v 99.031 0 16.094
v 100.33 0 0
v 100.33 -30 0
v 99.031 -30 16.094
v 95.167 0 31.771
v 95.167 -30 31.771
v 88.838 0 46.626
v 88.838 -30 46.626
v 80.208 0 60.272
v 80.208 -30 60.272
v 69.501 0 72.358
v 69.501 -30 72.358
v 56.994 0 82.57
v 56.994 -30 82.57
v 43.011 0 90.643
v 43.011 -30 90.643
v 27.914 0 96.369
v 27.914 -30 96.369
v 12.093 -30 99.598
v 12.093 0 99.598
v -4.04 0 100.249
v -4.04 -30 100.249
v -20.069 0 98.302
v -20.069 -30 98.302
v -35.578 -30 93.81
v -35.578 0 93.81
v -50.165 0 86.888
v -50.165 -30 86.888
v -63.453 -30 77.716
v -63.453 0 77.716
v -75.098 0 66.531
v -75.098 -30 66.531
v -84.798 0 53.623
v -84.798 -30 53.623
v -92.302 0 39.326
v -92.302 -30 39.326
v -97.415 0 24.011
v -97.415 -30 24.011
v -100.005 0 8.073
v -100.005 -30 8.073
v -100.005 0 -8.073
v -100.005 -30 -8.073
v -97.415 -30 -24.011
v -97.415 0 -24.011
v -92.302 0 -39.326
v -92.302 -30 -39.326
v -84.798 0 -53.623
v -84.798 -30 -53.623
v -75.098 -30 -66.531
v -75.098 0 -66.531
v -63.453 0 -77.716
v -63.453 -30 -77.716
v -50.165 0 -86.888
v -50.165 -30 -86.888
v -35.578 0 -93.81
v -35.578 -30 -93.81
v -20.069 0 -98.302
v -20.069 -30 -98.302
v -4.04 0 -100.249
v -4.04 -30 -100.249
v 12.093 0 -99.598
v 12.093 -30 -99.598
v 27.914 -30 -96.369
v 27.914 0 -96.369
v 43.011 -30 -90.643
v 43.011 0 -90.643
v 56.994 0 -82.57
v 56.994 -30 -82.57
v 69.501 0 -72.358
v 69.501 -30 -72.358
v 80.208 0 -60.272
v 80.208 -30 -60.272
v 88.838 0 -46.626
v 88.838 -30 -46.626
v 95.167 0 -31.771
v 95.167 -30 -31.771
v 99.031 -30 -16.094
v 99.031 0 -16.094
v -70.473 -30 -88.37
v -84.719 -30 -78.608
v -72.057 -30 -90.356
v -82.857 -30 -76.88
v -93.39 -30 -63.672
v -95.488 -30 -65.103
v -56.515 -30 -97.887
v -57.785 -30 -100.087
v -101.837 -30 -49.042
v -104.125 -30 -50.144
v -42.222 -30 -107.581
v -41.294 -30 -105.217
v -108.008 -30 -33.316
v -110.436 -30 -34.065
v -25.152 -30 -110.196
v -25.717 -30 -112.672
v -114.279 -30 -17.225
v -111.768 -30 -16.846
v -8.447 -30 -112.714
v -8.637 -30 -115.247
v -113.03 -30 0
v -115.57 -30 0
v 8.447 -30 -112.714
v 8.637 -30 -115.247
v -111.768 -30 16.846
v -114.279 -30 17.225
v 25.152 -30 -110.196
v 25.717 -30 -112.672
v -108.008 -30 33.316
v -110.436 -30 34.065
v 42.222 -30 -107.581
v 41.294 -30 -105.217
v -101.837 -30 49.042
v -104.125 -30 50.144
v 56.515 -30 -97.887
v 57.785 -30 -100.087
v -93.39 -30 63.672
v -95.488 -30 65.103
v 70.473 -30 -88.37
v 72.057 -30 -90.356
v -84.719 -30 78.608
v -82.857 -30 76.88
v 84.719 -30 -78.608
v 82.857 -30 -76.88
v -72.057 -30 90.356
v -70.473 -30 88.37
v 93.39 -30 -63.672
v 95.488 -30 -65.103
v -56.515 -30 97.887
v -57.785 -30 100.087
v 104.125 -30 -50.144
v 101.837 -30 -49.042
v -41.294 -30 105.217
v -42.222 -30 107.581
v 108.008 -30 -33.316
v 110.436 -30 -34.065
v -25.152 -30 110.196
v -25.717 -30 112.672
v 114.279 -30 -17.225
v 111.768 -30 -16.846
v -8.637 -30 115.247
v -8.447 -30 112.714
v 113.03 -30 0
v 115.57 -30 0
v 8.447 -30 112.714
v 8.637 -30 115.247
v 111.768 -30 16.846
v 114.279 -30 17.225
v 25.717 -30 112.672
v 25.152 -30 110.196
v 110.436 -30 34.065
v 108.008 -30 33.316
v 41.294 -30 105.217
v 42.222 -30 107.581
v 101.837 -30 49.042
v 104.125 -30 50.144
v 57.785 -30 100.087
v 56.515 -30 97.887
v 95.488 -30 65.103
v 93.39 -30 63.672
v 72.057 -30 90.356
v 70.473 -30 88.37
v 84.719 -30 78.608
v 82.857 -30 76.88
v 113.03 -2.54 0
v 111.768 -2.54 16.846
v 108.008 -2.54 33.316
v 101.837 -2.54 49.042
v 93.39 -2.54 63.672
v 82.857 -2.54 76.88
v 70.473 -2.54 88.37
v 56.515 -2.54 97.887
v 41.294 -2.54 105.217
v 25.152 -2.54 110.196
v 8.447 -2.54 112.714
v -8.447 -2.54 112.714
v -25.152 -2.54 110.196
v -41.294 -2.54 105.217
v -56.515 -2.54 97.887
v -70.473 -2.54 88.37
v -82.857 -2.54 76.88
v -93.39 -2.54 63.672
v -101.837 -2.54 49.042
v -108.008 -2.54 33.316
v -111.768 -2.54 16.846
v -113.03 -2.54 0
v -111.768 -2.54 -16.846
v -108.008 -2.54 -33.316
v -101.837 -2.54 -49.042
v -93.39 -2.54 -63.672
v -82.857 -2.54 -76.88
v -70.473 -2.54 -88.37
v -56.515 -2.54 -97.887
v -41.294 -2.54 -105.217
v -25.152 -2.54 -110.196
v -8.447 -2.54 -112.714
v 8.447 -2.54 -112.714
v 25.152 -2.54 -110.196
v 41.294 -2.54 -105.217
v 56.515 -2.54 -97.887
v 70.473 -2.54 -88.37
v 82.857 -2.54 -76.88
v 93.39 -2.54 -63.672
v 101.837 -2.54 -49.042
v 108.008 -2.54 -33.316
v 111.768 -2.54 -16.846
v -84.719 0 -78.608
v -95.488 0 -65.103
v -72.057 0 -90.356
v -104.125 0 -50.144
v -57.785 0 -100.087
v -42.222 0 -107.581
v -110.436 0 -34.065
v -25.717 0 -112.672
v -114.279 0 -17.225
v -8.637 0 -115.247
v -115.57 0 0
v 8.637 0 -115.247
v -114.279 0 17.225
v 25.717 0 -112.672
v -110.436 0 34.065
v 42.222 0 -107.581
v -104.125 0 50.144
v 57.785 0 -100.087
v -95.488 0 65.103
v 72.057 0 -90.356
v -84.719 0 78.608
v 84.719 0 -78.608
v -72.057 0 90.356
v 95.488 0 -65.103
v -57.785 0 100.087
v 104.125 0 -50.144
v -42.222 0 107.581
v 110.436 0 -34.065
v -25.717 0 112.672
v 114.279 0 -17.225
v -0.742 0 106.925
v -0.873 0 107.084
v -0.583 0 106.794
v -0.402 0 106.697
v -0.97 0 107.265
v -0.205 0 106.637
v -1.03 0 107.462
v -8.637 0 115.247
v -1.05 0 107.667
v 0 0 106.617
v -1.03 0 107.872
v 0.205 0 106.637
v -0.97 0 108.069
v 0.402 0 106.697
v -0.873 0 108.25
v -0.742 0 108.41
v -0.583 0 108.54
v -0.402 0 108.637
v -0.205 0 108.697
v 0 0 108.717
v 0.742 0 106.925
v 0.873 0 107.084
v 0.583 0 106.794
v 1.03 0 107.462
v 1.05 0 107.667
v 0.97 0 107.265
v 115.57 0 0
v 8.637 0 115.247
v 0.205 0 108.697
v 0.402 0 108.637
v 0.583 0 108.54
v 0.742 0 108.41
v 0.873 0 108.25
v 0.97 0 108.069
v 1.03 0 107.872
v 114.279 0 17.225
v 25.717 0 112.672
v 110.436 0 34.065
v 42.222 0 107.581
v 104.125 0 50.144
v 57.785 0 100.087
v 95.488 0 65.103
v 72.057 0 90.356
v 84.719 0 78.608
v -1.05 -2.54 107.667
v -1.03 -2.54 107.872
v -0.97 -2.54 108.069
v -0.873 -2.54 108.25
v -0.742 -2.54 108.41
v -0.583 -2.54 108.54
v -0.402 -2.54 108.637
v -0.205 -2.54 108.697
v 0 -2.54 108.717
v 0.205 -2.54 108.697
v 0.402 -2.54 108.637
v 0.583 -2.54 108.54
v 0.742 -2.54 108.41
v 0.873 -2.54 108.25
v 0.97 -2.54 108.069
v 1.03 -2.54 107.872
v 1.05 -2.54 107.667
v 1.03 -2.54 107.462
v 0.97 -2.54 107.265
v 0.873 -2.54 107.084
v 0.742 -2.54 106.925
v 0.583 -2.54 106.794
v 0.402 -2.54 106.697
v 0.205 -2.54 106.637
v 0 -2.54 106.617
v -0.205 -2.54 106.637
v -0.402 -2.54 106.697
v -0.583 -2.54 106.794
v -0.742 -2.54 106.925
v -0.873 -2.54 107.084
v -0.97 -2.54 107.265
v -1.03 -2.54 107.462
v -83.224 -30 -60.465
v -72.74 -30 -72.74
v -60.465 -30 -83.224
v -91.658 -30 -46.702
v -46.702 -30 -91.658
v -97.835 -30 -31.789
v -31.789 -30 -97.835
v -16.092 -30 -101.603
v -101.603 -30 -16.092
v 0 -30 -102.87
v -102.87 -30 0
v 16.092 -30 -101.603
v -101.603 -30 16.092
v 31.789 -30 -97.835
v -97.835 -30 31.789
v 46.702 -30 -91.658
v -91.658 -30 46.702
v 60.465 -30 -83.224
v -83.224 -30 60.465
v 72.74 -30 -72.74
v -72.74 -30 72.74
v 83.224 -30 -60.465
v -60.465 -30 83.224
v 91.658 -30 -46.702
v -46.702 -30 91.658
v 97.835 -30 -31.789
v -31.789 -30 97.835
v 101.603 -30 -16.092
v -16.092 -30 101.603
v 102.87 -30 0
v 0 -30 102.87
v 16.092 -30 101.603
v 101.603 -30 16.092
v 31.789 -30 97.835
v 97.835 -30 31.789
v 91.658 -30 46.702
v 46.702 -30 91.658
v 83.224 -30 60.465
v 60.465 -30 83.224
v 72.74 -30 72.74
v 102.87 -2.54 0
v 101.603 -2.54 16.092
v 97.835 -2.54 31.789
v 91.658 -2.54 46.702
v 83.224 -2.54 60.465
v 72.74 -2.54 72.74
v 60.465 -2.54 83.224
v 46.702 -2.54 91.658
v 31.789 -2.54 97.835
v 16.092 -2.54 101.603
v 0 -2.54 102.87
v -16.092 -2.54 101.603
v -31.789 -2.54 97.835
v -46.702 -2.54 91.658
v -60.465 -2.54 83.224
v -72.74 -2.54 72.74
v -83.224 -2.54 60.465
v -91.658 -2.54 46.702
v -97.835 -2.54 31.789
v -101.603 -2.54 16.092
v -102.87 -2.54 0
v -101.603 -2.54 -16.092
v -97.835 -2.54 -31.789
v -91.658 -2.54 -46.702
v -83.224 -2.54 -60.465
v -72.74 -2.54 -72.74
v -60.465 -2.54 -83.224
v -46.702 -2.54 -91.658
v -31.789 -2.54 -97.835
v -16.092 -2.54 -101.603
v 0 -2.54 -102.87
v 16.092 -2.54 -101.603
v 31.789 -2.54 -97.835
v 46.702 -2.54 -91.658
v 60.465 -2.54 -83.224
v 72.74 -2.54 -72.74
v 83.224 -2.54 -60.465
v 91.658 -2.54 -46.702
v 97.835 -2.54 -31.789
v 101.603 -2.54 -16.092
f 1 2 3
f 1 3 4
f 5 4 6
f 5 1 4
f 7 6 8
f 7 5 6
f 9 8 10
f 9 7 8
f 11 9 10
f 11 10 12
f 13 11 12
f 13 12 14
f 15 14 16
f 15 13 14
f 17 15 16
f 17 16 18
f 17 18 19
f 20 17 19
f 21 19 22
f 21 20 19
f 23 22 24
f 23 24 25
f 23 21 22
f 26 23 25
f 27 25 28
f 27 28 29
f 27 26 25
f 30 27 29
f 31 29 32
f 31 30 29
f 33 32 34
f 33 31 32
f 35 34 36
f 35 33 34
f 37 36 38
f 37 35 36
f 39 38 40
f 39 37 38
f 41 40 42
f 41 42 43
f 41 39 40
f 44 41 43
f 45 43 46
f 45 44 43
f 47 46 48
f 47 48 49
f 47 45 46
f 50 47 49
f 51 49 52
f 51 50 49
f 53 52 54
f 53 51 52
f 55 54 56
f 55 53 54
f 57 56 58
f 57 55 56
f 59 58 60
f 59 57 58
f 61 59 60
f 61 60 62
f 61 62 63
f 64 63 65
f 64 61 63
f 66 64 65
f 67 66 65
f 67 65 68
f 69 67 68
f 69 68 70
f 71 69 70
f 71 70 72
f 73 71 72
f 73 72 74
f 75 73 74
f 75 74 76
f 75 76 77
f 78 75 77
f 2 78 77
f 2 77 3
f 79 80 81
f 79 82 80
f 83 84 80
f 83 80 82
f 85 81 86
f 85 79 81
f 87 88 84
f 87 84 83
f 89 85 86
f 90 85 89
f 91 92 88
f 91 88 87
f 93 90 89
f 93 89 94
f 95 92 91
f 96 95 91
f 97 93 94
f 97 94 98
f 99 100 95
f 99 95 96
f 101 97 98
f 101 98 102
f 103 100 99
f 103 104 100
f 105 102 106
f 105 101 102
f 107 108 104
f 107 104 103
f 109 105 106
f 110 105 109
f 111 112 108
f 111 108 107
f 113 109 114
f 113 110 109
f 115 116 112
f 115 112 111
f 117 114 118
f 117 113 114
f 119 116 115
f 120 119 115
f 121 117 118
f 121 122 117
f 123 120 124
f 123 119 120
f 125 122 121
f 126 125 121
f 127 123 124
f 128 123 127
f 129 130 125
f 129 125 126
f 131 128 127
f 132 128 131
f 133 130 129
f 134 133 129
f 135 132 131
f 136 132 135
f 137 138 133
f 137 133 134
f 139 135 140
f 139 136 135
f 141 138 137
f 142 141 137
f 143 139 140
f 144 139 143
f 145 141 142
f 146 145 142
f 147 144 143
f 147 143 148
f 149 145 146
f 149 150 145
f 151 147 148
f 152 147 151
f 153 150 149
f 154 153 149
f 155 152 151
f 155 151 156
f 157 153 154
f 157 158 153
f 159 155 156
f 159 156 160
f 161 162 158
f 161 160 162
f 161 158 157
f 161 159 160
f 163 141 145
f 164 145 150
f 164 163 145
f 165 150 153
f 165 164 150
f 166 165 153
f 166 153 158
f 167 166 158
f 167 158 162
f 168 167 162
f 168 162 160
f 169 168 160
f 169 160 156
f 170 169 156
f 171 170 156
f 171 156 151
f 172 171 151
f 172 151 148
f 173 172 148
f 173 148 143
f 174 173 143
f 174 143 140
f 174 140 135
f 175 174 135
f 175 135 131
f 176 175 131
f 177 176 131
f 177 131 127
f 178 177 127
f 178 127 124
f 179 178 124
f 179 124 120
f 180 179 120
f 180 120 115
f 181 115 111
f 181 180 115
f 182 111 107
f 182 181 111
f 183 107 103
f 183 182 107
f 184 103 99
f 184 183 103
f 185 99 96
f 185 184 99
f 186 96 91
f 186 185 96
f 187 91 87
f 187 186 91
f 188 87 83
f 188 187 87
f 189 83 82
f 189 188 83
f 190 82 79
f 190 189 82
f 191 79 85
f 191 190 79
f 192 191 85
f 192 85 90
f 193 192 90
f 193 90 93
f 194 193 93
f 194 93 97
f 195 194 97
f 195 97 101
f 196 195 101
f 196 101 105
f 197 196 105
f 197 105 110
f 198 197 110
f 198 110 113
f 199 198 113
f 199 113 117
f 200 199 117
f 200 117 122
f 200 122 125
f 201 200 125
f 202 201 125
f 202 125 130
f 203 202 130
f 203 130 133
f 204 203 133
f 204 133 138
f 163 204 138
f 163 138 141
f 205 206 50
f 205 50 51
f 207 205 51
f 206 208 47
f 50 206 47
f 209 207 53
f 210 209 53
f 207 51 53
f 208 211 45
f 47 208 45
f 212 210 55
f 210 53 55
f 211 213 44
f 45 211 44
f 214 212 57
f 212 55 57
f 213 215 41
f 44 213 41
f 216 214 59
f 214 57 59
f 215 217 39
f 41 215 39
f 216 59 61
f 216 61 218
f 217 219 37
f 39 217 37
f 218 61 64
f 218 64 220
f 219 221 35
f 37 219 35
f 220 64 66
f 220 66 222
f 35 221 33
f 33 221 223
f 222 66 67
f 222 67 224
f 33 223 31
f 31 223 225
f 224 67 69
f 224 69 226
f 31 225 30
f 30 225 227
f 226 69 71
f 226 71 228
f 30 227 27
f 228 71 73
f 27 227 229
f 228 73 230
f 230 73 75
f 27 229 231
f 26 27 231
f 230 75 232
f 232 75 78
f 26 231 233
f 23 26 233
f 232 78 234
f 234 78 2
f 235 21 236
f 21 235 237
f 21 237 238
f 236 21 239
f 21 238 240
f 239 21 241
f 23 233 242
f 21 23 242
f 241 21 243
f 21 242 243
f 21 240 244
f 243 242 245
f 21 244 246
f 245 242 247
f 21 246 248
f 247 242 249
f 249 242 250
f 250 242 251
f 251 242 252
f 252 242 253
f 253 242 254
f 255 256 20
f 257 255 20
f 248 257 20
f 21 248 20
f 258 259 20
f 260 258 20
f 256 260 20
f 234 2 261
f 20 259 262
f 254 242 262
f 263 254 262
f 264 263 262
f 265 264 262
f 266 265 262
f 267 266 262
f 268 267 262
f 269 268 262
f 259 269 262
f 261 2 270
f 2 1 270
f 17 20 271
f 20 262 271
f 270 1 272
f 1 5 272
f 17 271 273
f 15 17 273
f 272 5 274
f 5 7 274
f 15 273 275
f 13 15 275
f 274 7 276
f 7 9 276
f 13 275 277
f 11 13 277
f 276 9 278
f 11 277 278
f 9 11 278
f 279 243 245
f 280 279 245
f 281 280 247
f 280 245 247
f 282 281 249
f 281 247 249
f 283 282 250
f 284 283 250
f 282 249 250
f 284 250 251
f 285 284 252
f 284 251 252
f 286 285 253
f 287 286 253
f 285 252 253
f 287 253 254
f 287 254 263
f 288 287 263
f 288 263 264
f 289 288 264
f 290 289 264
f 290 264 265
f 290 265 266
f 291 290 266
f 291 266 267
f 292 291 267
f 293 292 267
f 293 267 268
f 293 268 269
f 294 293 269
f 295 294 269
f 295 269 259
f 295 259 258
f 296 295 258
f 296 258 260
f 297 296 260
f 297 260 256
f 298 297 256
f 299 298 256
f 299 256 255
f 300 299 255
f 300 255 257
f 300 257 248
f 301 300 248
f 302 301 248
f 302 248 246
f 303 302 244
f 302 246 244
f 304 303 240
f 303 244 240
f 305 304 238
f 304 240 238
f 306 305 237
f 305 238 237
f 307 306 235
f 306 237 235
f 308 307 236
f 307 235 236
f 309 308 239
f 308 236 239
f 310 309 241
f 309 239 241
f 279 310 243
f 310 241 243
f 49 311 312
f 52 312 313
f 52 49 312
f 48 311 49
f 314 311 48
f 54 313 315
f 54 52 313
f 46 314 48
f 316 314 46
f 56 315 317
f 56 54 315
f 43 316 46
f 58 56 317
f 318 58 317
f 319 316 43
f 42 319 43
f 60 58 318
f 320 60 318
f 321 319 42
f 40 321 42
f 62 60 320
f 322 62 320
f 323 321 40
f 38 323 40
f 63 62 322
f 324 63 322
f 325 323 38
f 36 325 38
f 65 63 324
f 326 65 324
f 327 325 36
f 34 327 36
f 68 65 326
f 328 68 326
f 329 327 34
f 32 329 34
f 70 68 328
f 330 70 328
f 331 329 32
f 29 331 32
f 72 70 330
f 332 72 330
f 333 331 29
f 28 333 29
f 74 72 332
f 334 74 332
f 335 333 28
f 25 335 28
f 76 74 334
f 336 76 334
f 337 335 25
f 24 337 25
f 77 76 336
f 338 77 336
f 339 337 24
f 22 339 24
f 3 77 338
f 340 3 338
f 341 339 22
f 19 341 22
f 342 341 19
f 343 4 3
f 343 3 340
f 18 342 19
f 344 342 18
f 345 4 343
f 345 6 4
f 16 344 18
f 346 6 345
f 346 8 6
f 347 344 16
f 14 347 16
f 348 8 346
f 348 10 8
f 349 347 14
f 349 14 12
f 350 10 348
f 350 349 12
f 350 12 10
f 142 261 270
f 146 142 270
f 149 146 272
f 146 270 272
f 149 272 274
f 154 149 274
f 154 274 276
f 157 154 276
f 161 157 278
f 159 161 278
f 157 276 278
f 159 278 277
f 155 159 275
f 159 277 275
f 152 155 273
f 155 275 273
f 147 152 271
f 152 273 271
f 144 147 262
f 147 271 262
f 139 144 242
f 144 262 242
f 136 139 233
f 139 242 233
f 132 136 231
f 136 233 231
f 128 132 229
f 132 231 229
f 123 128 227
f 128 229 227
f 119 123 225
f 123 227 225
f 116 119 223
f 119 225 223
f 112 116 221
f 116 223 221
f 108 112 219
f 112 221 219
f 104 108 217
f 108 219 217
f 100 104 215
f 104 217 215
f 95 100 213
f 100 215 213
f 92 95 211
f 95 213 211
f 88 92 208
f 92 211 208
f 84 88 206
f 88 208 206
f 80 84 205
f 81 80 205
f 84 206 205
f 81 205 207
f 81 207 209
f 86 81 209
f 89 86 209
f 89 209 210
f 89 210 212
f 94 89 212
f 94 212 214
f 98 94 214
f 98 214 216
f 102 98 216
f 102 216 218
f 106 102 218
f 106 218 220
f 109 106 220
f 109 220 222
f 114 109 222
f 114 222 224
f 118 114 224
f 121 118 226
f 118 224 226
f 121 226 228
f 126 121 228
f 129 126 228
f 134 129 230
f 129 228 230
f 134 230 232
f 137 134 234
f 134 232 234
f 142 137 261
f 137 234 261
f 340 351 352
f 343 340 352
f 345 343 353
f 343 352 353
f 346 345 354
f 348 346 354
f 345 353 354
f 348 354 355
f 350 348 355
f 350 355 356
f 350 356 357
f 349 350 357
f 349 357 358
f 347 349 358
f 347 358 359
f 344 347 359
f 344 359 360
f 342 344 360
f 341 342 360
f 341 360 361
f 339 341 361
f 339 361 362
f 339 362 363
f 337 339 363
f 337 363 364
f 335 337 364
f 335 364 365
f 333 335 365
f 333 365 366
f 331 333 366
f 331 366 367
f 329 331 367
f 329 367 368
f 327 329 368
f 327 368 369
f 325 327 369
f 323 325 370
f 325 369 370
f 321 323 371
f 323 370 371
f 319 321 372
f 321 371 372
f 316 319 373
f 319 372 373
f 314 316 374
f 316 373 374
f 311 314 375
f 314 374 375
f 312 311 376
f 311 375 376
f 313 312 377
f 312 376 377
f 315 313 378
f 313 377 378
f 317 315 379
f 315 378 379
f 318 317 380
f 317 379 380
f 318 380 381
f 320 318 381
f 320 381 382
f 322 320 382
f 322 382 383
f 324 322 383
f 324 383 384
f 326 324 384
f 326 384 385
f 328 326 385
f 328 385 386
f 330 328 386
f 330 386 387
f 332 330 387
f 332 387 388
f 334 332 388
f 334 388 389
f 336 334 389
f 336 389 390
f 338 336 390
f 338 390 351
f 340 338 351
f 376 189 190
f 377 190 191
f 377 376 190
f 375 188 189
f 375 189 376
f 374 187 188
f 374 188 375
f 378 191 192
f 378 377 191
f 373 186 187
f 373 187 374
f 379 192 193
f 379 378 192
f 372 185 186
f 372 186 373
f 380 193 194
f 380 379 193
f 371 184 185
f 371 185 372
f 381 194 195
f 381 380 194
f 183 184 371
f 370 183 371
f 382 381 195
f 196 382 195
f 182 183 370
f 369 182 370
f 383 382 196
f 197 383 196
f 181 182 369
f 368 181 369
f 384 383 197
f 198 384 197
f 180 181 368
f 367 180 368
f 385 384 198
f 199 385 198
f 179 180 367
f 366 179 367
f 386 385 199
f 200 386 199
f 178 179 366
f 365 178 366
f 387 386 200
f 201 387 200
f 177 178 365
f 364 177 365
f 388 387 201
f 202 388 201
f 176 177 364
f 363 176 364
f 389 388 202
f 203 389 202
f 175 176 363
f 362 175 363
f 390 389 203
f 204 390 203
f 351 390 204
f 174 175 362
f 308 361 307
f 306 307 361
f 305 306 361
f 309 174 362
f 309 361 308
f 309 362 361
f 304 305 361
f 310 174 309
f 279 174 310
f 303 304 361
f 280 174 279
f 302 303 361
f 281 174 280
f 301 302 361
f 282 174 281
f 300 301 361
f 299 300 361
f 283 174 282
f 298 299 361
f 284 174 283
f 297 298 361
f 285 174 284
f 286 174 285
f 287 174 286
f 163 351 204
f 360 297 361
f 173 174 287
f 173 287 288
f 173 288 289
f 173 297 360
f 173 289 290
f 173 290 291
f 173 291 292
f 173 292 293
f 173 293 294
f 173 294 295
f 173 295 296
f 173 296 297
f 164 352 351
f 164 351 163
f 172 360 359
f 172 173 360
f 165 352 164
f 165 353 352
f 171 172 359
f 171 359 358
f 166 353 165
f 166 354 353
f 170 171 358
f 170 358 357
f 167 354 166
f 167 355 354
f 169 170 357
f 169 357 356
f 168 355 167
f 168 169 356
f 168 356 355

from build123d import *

# Parameters (mm, degrees)
F0_R     = 115.57
F0_R_2   = 100.33
F1_DEPTH = 30
F2_T     = -2.54
F4_D     = 2.1


with BuildPart() as f1:
    # F0 (on Front) → F1 (new body)
    with BuildSketch(Plane.XZ):
        Circle(F0_R)
        Circle(F0_R_2, mode=Mode.SUBTRACT)
    extrude(amount=F1_DEPTH)

    # F2
    f2_openings = [f1.faces().sort_by_distance(p)[0] for p in [
        (-112.301187, -30, 0),
    ]]
    offset(amount=F2_T, openings=f2_openings)

    # F4 (through all)
    with Locations(Plane.XZ.offset(2.54)):
        with Locations((0, 107.667133)):
            Hole(F4_D / 2)


solid = f1.part
